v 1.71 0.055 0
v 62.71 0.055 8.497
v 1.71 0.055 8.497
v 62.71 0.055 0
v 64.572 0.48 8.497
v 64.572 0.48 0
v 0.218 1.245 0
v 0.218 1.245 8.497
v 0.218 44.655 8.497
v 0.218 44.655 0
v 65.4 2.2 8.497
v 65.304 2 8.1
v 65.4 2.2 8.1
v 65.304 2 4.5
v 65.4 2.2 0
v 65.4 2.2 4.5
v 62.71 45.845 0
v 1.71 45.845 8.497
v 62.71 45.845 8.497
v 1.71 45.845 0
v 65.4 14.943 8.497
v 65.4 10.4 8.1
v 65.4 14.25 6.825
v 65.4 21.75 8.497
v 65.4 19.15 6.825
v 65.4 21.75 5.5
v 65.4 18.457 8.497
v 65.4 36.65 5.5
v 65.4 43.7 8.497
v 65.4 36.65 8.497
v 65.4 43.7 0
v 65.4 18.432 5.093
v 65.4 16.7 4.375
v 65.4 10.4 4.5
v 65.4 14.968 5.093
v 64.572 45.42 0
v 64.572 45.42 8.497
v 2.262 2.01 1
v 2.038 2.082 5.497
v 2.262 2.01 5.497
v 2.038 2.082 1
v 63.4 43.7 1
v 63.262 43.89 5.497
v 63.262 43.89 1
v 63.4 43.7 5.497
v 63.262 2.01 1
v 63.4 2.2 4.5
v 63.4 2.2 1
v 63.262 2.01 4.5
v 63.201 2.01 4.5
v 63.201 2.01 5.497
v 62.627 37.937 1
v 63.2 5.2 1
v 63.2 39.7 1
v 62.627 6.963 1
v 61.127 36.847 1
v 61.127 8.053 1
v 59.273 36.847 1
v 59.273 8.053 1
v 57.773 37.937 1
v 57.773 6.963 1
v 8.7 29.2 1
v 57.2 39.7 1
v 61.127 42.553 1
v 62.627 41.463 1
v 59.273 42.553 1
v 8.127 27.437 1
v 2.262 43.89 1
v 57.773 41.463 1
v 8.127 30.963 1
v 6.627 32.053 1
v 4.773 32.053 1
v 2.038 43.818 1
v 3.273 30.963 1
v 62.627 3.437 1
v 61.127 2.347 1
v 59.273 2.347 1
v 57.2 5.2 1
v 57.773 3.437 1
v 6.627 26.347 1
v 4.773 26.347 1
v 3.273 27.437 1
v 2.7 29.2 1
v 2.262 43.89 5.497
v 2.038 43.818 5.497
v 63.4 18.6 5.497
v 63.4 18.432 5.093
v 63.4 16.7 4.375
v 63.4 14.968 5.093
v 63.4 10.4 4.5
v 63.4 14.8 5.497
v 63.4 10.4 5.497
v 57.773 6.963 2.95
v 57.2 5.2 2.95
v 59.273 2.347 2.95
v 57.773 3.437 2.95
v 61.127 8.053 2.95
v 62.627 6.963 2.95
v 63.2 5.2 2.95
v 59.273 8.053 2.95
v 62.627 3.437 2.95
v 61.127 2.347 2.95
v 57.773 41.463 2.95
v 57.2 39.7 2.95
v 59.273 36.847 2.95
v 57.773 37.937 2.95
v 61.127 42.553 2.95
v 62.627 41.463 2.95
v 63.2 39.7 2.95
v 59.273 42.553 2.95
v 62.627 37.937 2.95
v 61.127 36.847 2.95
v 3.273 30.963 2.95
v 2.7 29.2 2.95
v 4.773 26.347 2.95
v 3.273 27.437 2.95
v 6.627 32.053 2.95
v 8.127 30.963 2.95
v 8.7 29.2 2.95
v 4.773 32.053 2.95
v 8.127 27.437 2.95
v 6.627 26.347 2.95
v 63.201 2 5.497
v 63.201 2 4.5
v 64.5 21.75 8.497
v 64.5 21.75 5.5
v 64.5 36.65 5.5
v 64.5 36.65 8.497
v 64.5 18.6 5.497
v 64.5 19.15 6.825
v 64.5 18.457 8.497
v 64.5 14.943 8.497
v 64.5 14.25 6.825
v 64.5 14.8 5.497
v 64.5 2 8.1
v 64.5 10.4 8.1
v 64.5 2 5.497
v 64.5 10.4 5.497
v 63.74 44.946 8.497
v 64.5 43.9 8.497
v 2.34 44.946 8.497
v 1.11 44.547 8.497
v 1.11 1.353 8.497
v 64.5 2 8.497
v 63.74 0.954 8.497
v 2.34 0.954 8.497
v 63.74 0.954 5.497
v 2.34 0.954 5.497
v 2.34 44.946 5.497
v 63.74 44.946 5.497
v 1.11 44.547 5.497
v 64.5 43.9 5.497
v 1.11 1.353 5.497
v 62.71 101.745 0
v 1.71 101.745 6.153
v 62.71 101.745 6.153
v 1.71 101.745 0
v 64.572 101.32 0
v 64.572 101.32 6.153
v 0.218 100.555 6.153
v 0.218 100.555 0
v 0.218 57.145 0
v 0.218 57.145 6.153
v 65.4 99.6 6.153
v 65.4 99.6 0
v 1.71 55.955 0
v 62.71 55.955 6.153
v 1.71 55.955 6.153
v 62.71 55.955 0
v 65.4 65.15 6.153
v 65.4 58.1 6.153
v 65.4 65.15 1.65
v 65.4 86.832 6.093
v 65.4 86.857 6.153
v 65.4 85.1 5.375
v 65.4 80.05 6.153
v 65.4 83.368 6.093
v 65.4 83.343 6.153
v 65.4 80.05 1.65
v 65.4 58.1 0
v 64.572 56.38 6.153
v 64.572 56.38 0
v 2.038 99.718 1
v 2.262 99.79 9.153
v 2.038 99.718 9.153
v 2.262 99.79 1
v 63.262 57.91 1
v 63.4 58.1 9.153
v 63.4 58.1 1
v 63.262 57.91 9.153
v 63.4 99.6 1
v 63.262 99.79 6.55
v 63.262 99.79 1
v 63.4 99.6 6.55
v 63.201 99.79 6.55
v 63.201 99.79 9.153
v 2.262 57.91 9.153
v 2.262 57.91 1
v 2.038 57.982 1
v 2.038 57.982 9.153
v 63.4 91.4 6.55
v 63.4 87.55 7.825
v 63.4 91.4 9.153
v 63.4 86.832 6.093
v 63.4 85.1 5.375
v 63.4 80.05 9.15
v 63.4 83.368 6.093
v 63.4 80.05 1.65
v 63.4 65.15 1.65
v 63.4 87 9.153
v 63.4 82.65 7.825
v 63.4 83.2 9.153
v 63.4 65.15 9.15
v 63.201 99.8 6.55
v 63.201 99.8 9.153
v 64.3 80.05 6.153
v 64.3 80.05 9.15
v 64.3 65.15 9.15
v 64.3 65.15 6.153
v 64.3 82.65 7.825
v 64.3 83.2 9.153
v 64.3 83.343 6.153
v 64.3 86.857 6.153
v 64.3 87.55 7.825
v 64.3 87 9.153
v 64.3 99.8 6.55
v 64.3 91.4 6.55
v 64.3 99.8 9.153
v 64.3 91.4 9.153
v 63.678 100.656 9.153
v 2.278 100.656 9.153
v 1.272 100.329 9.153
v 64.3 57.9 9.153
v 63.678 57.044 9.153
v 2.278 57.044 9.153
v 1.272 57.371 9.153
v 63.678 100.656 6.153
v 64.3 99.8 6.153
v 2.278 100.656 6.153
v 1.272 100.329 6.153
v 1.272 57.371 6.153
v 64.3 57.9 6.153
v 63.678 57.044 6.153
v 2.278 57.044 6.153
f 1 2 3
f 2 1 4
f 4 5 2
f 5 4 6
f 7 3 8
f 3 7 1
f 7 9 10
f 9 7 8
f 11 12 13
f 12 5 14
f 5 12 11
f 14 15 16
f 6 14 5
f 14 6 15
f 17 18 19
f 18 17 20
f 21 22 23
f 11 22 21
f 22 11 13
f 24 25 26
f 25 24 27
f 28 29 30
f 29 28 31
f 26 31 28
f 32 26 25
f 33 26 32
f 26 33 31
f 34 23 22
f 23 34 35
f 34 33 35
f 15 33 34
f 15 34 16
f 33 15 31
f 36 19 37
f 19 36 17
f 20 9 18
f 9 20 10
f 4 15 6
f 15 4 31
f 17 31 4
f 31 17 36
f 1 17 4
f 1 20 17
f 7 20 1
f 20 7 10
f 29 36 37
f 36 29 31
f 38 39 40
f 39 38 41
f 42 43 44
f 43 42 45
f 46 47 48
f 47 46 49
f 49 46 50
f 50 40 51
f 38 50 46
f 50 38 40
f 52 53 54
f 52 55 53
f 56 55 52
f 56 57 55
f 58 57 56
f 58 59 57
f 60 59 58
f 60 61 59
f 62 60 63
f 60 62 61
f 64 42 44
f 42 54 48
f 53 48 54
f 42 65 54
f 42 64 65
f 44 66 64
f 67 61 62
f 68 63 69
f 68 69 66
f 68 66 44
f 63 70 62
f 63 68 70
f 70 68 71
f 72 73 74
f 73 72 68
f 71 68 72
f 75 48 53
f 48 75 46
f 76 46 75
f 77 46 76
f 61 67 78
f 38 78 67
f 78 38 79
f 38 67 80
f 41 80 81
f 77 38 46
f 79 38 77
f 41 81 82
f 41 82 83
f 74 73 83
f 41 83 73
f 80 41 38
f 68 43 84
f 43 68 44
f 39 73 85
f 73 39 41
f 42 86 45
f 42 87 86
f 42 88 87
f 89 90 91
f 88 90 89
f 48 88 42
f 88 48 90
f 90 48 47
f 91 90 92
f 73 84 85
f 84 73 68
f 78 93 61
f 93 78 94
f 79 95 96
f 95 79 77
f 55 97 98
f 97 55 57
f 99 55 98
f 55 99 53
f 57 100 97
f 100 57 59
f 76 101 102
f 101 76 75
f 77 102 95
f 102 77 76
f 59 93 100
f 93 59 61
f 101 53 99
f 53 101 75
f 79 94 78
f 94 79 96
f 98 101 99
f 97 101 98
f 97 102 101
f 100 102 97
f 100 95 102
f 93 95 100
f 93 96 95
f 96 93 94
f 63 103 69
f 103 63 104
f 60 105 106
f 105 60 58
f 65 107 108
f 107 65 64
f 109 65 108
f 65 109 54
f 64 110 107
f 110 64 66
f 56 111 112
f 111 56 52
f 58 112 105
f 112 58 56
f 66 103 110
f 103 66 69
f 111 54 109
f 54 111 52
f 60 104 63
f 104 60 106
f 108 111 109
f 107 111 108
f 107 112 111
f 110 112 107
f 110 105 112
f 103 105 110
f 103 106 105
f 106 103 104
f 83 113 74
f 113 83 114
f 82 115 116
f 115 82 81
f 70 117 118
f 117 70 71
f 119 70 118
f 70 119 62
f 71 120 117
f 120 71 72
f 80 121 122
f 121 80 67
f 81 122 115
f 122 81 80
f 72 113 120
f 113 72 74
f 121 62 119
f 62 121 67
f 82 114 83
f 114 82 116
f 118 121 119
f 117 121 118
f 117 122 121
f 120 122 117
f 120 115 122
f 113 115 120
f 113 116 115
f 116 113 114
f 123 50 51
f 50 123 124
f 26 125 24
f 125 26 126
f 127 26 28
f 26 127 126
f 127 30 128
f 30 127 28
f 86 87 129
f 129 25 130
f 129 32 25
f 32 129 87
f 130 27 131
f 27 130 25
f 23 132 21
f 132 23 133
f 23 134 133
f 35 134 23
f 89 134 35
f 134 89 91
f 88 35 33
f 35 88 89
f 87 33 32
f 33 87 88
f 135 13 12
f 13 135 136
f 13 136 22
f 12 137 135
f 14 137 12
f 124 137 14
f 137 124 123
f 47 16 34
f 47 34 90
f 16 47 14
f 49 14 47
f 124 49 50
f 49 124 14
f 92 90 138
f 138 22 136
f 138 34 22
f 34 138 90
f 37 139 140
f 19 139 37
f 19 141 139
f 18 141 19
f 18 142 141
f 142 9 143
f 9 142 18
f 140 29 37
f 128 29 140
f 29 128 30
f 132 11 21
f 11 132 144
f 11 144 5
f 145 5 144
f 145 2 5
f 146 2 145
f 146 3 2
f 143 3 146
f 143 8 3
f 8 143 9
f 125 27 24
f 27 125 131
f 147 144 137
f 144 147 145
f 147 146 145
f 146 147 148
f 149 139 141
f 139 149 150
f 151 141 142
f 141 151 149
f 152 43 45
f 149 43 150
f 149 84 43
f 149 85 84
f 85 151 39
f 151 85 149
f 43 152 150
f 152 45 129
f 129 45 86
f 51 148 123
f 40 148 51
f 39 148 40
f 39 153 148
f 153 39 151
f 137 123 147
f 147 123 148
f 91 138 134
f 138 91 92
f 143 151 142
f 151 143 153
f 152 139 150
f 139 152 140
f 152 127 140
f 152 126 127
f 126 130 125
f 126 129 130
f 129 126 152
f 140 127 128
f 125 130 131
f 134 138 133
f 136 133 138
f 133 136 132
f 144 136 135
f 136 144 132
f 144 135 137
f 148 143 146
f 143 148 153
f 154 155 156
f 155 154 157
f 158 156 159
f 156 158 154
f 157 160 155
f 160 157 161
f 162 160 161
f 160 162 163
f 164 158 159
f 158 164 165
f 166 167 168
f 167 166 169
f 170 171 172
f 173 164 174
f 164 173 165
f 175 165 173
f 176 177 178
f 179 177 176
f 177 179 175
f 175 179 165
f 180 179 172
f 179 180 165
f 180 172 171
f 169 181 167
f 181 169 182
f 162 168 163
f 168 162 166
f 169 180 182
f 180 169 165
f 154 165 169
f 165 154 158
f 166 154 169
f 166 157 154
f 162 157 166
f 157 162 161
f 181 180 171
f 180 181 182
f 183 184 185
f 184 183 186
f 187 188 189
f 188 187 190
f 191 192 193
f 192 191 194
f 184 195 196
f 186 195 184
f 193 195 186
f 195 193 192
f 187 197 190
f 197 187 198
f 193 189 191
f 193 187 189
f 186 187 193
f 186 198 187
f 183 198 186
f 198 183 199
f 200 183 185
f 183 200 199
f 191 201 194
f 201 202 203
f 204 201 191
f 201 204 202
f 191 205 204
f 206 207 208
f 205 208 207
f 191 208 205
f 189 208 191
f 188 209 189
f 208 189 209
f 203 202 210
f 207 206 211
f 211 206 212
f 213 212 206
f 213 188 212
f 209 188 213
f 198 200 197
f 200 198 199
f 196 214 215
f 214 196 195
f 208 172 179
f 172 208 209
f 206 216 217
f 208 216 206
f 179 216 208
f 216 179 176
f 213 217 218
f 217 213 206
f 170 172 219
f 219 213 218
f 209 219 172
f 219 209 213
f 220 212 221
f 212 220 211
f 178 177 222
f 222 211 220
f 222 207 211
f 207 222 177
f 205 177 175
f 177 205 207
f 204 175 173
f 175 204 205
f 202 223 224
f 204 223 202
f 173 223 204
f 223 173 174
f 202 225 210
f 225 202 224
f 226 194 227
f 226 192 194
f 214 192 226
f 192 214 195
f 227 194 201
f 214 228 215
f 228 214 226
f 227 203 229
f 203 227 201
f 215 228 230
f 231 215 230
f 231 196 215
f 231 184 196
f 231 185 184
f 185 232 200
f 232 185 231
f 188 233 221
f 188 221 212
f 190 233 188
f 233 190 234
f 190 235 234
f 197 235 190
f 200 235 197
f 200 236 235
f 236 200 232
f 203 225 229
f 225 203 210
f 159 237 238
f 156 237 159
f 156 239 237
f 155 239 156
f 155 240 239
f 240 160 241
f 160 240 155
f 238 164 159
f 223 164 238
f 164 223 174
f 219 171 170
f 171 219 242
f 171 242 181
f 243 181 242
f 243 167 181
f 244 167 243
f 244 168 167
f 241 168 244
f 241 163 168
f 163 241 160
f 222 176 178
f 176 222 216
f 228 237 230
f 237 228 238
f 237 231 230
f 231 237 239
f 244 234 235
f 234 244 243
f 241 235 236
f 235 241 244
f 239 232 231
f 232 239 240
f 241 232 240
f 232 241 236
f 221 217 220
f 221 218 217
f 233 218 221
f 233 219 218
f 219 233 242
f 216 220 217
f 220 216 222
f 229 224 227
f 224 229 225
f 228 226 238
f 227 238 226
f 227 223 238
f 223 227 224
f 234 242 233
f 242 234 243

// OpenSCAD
// file: lib_metric_sizes.scad
m2   = 2.8;
m2_5 = 3.2;
m3   = 3.6;
m4   = 4.8;
m5   = 5.6;
m6   = 6.4;
// file: lib_nuts.scad
include <lib_metric_sizes.scad>

m2_nut = [5.2, 1.7];
m3_nut = [6.8, 2.3];
m4_nut = [8.4, 2.8];

m2_flat_nut = [5.2, 2.0];
m3_flat_nut = [6.8, 2.0];
m4_flat_nut = [8.4, 2.0];

//m2_nylon_nut = [, ];
//m2_5_nylon_nut = [, ];
//m3_nylon_nut = [, ];
m4_nylon_nut = [8.4, 3.3];
m5_nylon_nut = [10.0, 4.0];
m6_nylon_nut = [12.4, 5.0];
// file: lib_self_tapping_screws.scad
include <lib_metric_sizes.scad>

m3_st_roundhead = [7.2, 2.0];
m3_st_flathead = [7.2, 0];
// file: lib_machine_screws.scad
include <lib_metric_sizes.scad>

m2x12_shaft = [m2, 12.0];
m2x19_shaft = [m2, 19.0];
m3x12_shaft = [m3, 12.0];
m3x17_shaft = [m3, 17.0];
m3x19_shaft = [m3, 19.0];
m4x12_shaft = [m4, 12.0];
m4x25_shaft = [m4, 25.0];

m2_roundhead = [4.0, 1.0];
m3_roundhead = [5.6, 1.7];
m4_roundhead = [7.2, 2.3];

m2_flathead = [4.0, 1.0];
m3_flathead = [5.6, 1.0];
m4_flathead = [7.2, 1.0];
// file: lib_gadgets.scad
include <lib_machine_screws.scad>
include <lib_self_tapping_screws.scad>
include <lib_nuts.scad>

module stud(shaft, self_tapping=false)
{
	ds = self_tapping ? shaft[0]-0.4 : shaft[0];
	
	cylinder(h=shaft[1], d=ds);
}

module bolt(head, shaft, countersink=false, self_tapping=false) {
	ds = self_tapping ? shaft[0]-0.4 : shaft[0];
	
	cylinder(h=head[1], d=head[0]);
	cylinder(h=shaft[1]+head[1], d=ds);
	if (countersink == true) {
		translate([0, 0, head[1]]) {
			cylinder(h=head[0], d1=head[0], d2=0);
		}
	}
}

module nut(head, countersink=false) {
	cylinder(h=head[1], d=head[0], $fn=6);
	if (countersink == true) {
		translate([0, 0, head[1]]) {
			cylinder(h=head[0], d1=head[0], d2=0, $fn=6);
		}
	}
}

module post(pos, radius, height) {
	translate([pos[0], pos[1], 0]) { 
		cylinder(h=height, r=radius); 
	}
}

module spacer(pos, outer_r, inner_r, height) {
	translate([pos[0], pos[1], 0]) { 
		difference() {
			cylinder(h=height, r=outer_r); 
			if (inner_r > 0) {
				cylinder(h=height+0.0001, r=inner_r); 
			}
		}
	}
}

module grid(size, xx, yy) {
	if (size > 0) {
		for (x = [0 : size : xx] ) {
			translate([x, 0, 0]) cube([0.8, yy, 0.4]);
		}
		for (y = [0 : size : yy] ) {
			translate([0, y, 0]) cube([xx, 0.8, 0.4]);
		}
	}
}
// file: lib_soft.scad
/** 
 * An OpenSCAD library for creating shapes with rounded edges
 *
 * @author Paul Generes <paul.generes@gmail.com>
 * @example soft_example.scad
 */
 
module soft_cube(size=[1, 1, 1], center=false, cr=1) {
	tr = [cr, cr, cr];

    translate(tr) {
        minkowski() {
            sphere(cr);
            cube([size[0]-2*cr, size[1]-2*cr, size[2]-2*cr], center);
        }
    }
}

module softxyz_cube(size=1, center=false, cr=[1, 1, 1]) {
	tr = cr;

    translate(tr) {
        minkowski() {
			scale(cr) {
				sphere(1);
			}
            cube([size[0]-2*cr[0], size[1]-2*cr[1], size[2]-2*cr[2]], center);
        }
    }
}

module softz_cube(size=1, center=false, cr=1) {
	tr = [cr, cr, 0];

    translate(tr) {
        minkowski() {
			cylinder(h=0.00001, r=cr);
			cube([size[0]-2*cr, size[1]-2*cr, size[2]-0.00001], center);
        }
    }
}
// main file
include <lib_enclosure4.scad>



function fillet_z()         = 0;
function device_x()         = 61; // without the official case;
function device_y()         = 41.5;
function device_z()         = 10.5;
function pcb_z()            = 1.75;

function wall_thickness()   = 2;
function bottom_thickness() = 1;
function top_thickness()    = 1;
function tolerance()        = 0.2;
function friction()         = 3;
function spacing()          = 10;
function split()            = 0.58;
function riser_z()          = 1.75;
function riser_thickness()  = 0;

usbotg    = [ [   4, pcb_z()+3.2/2],     [8, 3.2]    ];
headphone = [ [14.5, pcb_z()+4.5/4+1], 4.5/2       ];
usb       = [ [  27, pcb_z()+7.1/2+1],   [14.5, 7.1] ];



enclosure();

module right_cutouts(is_bottom) {
        square_cutout(usbotg[0], usbotg[1]);
        circle_cutout(headphone[0], headphone[1]);
        square_cutout(usb[0], usb[1]);
}

module left_cutouts(is_bottom) {
}

module front_cutouts(is_bottom) {
}

module back_cutouts(is_bottom) {
}

module top_cutouts() {
}

module bottom_cutouts() {
}

module cutouts(is_bottom) {
    //rubber_band_grooves();
    //engraving();
	//rubber_feet(3.5);
}

module attachments(is_bottom) {
}

module stand_offs(){
}

module final_attachments(is_bottom) {
}

module engraving() {
	top_face() {
		translate([inner_x()/2, outer_y()/2, 0]) {
			linear_extrude(0.4) {
				rotate([0, 0, 0]) {
					text(text="OCTOCHIP", halign="center", valign="center", size=6);
                }
            }
        }
    }
}

module rubber_band_grooves() {
	rubber_band_y(3.0, 0.4,             5.0);
	rubber_band_y(3.0, 0.4, outer_x()-3.0-5.0);
}

module rubber_feet(radius) {
	bottom_face() {
		translate([        10,         10, 0]) cylinder(h=0.95, r=radius);
		translate([        10, inner_y()-10, 0]) cylinder(h=0.95, r=radius);
		translate([inner_x()-10,         10, 0]) cylinder(h=0.95, r=radius);
		translate([inner_x()-10, inner_y()-10, 0]) cylinder(h=0.95, r=radius);
	}
}

module stand_offs() {
	stand_off([ 58,  3], 3, 0);
	stand_off([ 58,  37.5], 3, 0);
	stand_off([3.5,  27], 3, 0);
	//stand_off([ 3.5, 52.5], 3.2, 1.6);
	//stand_off([61.5, 52.5], 3.2, 1.6);
}
